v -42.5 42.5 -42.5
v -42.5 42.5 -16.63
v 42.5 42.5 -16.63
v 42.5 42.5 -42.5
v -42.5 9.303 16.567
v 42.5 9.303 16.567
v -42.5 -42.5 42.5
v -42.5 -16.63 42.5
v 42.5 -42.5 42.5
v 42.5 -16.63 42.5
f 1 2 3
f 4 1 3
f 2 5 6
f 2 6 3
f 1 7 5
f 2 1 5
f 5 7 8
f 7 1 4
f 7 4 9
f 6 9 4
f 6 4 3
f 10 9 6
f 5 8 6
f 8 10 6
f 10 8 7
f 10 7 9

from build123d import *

# Parameters (mm, degrees)
F0_W     = 85
F0_H     = 85
F1_DEPTH = 42.5
F7_DEPTH = 50


with BuildPart() as f1:
    # F0 (on Top) → F1 (new body, symmetric)
    with BuildSketch(Plane.XY):
        Rectangle(F0_W, F0_H)
    extrude(amount=F1_DEPTH, both=True)

    # F6 (on Right) → F7 (cut, symmetric)
    with BuildSketch(Plane.YZ):
        Polygon((75.503635, -75.503635), (0, 0), (-49.804213, 49.804213), (-49.804213, -75.503635), align=None)
        Polygon((-34.243761, 60.113393), (9.302937, 16.566695), (63.825734, -37.956103), (63.825734, 60.113393), align=None)
    extrude(amount=F7_DEPTH, both=True, mode=Mode.SUBTRACT)


solid = f1.part
